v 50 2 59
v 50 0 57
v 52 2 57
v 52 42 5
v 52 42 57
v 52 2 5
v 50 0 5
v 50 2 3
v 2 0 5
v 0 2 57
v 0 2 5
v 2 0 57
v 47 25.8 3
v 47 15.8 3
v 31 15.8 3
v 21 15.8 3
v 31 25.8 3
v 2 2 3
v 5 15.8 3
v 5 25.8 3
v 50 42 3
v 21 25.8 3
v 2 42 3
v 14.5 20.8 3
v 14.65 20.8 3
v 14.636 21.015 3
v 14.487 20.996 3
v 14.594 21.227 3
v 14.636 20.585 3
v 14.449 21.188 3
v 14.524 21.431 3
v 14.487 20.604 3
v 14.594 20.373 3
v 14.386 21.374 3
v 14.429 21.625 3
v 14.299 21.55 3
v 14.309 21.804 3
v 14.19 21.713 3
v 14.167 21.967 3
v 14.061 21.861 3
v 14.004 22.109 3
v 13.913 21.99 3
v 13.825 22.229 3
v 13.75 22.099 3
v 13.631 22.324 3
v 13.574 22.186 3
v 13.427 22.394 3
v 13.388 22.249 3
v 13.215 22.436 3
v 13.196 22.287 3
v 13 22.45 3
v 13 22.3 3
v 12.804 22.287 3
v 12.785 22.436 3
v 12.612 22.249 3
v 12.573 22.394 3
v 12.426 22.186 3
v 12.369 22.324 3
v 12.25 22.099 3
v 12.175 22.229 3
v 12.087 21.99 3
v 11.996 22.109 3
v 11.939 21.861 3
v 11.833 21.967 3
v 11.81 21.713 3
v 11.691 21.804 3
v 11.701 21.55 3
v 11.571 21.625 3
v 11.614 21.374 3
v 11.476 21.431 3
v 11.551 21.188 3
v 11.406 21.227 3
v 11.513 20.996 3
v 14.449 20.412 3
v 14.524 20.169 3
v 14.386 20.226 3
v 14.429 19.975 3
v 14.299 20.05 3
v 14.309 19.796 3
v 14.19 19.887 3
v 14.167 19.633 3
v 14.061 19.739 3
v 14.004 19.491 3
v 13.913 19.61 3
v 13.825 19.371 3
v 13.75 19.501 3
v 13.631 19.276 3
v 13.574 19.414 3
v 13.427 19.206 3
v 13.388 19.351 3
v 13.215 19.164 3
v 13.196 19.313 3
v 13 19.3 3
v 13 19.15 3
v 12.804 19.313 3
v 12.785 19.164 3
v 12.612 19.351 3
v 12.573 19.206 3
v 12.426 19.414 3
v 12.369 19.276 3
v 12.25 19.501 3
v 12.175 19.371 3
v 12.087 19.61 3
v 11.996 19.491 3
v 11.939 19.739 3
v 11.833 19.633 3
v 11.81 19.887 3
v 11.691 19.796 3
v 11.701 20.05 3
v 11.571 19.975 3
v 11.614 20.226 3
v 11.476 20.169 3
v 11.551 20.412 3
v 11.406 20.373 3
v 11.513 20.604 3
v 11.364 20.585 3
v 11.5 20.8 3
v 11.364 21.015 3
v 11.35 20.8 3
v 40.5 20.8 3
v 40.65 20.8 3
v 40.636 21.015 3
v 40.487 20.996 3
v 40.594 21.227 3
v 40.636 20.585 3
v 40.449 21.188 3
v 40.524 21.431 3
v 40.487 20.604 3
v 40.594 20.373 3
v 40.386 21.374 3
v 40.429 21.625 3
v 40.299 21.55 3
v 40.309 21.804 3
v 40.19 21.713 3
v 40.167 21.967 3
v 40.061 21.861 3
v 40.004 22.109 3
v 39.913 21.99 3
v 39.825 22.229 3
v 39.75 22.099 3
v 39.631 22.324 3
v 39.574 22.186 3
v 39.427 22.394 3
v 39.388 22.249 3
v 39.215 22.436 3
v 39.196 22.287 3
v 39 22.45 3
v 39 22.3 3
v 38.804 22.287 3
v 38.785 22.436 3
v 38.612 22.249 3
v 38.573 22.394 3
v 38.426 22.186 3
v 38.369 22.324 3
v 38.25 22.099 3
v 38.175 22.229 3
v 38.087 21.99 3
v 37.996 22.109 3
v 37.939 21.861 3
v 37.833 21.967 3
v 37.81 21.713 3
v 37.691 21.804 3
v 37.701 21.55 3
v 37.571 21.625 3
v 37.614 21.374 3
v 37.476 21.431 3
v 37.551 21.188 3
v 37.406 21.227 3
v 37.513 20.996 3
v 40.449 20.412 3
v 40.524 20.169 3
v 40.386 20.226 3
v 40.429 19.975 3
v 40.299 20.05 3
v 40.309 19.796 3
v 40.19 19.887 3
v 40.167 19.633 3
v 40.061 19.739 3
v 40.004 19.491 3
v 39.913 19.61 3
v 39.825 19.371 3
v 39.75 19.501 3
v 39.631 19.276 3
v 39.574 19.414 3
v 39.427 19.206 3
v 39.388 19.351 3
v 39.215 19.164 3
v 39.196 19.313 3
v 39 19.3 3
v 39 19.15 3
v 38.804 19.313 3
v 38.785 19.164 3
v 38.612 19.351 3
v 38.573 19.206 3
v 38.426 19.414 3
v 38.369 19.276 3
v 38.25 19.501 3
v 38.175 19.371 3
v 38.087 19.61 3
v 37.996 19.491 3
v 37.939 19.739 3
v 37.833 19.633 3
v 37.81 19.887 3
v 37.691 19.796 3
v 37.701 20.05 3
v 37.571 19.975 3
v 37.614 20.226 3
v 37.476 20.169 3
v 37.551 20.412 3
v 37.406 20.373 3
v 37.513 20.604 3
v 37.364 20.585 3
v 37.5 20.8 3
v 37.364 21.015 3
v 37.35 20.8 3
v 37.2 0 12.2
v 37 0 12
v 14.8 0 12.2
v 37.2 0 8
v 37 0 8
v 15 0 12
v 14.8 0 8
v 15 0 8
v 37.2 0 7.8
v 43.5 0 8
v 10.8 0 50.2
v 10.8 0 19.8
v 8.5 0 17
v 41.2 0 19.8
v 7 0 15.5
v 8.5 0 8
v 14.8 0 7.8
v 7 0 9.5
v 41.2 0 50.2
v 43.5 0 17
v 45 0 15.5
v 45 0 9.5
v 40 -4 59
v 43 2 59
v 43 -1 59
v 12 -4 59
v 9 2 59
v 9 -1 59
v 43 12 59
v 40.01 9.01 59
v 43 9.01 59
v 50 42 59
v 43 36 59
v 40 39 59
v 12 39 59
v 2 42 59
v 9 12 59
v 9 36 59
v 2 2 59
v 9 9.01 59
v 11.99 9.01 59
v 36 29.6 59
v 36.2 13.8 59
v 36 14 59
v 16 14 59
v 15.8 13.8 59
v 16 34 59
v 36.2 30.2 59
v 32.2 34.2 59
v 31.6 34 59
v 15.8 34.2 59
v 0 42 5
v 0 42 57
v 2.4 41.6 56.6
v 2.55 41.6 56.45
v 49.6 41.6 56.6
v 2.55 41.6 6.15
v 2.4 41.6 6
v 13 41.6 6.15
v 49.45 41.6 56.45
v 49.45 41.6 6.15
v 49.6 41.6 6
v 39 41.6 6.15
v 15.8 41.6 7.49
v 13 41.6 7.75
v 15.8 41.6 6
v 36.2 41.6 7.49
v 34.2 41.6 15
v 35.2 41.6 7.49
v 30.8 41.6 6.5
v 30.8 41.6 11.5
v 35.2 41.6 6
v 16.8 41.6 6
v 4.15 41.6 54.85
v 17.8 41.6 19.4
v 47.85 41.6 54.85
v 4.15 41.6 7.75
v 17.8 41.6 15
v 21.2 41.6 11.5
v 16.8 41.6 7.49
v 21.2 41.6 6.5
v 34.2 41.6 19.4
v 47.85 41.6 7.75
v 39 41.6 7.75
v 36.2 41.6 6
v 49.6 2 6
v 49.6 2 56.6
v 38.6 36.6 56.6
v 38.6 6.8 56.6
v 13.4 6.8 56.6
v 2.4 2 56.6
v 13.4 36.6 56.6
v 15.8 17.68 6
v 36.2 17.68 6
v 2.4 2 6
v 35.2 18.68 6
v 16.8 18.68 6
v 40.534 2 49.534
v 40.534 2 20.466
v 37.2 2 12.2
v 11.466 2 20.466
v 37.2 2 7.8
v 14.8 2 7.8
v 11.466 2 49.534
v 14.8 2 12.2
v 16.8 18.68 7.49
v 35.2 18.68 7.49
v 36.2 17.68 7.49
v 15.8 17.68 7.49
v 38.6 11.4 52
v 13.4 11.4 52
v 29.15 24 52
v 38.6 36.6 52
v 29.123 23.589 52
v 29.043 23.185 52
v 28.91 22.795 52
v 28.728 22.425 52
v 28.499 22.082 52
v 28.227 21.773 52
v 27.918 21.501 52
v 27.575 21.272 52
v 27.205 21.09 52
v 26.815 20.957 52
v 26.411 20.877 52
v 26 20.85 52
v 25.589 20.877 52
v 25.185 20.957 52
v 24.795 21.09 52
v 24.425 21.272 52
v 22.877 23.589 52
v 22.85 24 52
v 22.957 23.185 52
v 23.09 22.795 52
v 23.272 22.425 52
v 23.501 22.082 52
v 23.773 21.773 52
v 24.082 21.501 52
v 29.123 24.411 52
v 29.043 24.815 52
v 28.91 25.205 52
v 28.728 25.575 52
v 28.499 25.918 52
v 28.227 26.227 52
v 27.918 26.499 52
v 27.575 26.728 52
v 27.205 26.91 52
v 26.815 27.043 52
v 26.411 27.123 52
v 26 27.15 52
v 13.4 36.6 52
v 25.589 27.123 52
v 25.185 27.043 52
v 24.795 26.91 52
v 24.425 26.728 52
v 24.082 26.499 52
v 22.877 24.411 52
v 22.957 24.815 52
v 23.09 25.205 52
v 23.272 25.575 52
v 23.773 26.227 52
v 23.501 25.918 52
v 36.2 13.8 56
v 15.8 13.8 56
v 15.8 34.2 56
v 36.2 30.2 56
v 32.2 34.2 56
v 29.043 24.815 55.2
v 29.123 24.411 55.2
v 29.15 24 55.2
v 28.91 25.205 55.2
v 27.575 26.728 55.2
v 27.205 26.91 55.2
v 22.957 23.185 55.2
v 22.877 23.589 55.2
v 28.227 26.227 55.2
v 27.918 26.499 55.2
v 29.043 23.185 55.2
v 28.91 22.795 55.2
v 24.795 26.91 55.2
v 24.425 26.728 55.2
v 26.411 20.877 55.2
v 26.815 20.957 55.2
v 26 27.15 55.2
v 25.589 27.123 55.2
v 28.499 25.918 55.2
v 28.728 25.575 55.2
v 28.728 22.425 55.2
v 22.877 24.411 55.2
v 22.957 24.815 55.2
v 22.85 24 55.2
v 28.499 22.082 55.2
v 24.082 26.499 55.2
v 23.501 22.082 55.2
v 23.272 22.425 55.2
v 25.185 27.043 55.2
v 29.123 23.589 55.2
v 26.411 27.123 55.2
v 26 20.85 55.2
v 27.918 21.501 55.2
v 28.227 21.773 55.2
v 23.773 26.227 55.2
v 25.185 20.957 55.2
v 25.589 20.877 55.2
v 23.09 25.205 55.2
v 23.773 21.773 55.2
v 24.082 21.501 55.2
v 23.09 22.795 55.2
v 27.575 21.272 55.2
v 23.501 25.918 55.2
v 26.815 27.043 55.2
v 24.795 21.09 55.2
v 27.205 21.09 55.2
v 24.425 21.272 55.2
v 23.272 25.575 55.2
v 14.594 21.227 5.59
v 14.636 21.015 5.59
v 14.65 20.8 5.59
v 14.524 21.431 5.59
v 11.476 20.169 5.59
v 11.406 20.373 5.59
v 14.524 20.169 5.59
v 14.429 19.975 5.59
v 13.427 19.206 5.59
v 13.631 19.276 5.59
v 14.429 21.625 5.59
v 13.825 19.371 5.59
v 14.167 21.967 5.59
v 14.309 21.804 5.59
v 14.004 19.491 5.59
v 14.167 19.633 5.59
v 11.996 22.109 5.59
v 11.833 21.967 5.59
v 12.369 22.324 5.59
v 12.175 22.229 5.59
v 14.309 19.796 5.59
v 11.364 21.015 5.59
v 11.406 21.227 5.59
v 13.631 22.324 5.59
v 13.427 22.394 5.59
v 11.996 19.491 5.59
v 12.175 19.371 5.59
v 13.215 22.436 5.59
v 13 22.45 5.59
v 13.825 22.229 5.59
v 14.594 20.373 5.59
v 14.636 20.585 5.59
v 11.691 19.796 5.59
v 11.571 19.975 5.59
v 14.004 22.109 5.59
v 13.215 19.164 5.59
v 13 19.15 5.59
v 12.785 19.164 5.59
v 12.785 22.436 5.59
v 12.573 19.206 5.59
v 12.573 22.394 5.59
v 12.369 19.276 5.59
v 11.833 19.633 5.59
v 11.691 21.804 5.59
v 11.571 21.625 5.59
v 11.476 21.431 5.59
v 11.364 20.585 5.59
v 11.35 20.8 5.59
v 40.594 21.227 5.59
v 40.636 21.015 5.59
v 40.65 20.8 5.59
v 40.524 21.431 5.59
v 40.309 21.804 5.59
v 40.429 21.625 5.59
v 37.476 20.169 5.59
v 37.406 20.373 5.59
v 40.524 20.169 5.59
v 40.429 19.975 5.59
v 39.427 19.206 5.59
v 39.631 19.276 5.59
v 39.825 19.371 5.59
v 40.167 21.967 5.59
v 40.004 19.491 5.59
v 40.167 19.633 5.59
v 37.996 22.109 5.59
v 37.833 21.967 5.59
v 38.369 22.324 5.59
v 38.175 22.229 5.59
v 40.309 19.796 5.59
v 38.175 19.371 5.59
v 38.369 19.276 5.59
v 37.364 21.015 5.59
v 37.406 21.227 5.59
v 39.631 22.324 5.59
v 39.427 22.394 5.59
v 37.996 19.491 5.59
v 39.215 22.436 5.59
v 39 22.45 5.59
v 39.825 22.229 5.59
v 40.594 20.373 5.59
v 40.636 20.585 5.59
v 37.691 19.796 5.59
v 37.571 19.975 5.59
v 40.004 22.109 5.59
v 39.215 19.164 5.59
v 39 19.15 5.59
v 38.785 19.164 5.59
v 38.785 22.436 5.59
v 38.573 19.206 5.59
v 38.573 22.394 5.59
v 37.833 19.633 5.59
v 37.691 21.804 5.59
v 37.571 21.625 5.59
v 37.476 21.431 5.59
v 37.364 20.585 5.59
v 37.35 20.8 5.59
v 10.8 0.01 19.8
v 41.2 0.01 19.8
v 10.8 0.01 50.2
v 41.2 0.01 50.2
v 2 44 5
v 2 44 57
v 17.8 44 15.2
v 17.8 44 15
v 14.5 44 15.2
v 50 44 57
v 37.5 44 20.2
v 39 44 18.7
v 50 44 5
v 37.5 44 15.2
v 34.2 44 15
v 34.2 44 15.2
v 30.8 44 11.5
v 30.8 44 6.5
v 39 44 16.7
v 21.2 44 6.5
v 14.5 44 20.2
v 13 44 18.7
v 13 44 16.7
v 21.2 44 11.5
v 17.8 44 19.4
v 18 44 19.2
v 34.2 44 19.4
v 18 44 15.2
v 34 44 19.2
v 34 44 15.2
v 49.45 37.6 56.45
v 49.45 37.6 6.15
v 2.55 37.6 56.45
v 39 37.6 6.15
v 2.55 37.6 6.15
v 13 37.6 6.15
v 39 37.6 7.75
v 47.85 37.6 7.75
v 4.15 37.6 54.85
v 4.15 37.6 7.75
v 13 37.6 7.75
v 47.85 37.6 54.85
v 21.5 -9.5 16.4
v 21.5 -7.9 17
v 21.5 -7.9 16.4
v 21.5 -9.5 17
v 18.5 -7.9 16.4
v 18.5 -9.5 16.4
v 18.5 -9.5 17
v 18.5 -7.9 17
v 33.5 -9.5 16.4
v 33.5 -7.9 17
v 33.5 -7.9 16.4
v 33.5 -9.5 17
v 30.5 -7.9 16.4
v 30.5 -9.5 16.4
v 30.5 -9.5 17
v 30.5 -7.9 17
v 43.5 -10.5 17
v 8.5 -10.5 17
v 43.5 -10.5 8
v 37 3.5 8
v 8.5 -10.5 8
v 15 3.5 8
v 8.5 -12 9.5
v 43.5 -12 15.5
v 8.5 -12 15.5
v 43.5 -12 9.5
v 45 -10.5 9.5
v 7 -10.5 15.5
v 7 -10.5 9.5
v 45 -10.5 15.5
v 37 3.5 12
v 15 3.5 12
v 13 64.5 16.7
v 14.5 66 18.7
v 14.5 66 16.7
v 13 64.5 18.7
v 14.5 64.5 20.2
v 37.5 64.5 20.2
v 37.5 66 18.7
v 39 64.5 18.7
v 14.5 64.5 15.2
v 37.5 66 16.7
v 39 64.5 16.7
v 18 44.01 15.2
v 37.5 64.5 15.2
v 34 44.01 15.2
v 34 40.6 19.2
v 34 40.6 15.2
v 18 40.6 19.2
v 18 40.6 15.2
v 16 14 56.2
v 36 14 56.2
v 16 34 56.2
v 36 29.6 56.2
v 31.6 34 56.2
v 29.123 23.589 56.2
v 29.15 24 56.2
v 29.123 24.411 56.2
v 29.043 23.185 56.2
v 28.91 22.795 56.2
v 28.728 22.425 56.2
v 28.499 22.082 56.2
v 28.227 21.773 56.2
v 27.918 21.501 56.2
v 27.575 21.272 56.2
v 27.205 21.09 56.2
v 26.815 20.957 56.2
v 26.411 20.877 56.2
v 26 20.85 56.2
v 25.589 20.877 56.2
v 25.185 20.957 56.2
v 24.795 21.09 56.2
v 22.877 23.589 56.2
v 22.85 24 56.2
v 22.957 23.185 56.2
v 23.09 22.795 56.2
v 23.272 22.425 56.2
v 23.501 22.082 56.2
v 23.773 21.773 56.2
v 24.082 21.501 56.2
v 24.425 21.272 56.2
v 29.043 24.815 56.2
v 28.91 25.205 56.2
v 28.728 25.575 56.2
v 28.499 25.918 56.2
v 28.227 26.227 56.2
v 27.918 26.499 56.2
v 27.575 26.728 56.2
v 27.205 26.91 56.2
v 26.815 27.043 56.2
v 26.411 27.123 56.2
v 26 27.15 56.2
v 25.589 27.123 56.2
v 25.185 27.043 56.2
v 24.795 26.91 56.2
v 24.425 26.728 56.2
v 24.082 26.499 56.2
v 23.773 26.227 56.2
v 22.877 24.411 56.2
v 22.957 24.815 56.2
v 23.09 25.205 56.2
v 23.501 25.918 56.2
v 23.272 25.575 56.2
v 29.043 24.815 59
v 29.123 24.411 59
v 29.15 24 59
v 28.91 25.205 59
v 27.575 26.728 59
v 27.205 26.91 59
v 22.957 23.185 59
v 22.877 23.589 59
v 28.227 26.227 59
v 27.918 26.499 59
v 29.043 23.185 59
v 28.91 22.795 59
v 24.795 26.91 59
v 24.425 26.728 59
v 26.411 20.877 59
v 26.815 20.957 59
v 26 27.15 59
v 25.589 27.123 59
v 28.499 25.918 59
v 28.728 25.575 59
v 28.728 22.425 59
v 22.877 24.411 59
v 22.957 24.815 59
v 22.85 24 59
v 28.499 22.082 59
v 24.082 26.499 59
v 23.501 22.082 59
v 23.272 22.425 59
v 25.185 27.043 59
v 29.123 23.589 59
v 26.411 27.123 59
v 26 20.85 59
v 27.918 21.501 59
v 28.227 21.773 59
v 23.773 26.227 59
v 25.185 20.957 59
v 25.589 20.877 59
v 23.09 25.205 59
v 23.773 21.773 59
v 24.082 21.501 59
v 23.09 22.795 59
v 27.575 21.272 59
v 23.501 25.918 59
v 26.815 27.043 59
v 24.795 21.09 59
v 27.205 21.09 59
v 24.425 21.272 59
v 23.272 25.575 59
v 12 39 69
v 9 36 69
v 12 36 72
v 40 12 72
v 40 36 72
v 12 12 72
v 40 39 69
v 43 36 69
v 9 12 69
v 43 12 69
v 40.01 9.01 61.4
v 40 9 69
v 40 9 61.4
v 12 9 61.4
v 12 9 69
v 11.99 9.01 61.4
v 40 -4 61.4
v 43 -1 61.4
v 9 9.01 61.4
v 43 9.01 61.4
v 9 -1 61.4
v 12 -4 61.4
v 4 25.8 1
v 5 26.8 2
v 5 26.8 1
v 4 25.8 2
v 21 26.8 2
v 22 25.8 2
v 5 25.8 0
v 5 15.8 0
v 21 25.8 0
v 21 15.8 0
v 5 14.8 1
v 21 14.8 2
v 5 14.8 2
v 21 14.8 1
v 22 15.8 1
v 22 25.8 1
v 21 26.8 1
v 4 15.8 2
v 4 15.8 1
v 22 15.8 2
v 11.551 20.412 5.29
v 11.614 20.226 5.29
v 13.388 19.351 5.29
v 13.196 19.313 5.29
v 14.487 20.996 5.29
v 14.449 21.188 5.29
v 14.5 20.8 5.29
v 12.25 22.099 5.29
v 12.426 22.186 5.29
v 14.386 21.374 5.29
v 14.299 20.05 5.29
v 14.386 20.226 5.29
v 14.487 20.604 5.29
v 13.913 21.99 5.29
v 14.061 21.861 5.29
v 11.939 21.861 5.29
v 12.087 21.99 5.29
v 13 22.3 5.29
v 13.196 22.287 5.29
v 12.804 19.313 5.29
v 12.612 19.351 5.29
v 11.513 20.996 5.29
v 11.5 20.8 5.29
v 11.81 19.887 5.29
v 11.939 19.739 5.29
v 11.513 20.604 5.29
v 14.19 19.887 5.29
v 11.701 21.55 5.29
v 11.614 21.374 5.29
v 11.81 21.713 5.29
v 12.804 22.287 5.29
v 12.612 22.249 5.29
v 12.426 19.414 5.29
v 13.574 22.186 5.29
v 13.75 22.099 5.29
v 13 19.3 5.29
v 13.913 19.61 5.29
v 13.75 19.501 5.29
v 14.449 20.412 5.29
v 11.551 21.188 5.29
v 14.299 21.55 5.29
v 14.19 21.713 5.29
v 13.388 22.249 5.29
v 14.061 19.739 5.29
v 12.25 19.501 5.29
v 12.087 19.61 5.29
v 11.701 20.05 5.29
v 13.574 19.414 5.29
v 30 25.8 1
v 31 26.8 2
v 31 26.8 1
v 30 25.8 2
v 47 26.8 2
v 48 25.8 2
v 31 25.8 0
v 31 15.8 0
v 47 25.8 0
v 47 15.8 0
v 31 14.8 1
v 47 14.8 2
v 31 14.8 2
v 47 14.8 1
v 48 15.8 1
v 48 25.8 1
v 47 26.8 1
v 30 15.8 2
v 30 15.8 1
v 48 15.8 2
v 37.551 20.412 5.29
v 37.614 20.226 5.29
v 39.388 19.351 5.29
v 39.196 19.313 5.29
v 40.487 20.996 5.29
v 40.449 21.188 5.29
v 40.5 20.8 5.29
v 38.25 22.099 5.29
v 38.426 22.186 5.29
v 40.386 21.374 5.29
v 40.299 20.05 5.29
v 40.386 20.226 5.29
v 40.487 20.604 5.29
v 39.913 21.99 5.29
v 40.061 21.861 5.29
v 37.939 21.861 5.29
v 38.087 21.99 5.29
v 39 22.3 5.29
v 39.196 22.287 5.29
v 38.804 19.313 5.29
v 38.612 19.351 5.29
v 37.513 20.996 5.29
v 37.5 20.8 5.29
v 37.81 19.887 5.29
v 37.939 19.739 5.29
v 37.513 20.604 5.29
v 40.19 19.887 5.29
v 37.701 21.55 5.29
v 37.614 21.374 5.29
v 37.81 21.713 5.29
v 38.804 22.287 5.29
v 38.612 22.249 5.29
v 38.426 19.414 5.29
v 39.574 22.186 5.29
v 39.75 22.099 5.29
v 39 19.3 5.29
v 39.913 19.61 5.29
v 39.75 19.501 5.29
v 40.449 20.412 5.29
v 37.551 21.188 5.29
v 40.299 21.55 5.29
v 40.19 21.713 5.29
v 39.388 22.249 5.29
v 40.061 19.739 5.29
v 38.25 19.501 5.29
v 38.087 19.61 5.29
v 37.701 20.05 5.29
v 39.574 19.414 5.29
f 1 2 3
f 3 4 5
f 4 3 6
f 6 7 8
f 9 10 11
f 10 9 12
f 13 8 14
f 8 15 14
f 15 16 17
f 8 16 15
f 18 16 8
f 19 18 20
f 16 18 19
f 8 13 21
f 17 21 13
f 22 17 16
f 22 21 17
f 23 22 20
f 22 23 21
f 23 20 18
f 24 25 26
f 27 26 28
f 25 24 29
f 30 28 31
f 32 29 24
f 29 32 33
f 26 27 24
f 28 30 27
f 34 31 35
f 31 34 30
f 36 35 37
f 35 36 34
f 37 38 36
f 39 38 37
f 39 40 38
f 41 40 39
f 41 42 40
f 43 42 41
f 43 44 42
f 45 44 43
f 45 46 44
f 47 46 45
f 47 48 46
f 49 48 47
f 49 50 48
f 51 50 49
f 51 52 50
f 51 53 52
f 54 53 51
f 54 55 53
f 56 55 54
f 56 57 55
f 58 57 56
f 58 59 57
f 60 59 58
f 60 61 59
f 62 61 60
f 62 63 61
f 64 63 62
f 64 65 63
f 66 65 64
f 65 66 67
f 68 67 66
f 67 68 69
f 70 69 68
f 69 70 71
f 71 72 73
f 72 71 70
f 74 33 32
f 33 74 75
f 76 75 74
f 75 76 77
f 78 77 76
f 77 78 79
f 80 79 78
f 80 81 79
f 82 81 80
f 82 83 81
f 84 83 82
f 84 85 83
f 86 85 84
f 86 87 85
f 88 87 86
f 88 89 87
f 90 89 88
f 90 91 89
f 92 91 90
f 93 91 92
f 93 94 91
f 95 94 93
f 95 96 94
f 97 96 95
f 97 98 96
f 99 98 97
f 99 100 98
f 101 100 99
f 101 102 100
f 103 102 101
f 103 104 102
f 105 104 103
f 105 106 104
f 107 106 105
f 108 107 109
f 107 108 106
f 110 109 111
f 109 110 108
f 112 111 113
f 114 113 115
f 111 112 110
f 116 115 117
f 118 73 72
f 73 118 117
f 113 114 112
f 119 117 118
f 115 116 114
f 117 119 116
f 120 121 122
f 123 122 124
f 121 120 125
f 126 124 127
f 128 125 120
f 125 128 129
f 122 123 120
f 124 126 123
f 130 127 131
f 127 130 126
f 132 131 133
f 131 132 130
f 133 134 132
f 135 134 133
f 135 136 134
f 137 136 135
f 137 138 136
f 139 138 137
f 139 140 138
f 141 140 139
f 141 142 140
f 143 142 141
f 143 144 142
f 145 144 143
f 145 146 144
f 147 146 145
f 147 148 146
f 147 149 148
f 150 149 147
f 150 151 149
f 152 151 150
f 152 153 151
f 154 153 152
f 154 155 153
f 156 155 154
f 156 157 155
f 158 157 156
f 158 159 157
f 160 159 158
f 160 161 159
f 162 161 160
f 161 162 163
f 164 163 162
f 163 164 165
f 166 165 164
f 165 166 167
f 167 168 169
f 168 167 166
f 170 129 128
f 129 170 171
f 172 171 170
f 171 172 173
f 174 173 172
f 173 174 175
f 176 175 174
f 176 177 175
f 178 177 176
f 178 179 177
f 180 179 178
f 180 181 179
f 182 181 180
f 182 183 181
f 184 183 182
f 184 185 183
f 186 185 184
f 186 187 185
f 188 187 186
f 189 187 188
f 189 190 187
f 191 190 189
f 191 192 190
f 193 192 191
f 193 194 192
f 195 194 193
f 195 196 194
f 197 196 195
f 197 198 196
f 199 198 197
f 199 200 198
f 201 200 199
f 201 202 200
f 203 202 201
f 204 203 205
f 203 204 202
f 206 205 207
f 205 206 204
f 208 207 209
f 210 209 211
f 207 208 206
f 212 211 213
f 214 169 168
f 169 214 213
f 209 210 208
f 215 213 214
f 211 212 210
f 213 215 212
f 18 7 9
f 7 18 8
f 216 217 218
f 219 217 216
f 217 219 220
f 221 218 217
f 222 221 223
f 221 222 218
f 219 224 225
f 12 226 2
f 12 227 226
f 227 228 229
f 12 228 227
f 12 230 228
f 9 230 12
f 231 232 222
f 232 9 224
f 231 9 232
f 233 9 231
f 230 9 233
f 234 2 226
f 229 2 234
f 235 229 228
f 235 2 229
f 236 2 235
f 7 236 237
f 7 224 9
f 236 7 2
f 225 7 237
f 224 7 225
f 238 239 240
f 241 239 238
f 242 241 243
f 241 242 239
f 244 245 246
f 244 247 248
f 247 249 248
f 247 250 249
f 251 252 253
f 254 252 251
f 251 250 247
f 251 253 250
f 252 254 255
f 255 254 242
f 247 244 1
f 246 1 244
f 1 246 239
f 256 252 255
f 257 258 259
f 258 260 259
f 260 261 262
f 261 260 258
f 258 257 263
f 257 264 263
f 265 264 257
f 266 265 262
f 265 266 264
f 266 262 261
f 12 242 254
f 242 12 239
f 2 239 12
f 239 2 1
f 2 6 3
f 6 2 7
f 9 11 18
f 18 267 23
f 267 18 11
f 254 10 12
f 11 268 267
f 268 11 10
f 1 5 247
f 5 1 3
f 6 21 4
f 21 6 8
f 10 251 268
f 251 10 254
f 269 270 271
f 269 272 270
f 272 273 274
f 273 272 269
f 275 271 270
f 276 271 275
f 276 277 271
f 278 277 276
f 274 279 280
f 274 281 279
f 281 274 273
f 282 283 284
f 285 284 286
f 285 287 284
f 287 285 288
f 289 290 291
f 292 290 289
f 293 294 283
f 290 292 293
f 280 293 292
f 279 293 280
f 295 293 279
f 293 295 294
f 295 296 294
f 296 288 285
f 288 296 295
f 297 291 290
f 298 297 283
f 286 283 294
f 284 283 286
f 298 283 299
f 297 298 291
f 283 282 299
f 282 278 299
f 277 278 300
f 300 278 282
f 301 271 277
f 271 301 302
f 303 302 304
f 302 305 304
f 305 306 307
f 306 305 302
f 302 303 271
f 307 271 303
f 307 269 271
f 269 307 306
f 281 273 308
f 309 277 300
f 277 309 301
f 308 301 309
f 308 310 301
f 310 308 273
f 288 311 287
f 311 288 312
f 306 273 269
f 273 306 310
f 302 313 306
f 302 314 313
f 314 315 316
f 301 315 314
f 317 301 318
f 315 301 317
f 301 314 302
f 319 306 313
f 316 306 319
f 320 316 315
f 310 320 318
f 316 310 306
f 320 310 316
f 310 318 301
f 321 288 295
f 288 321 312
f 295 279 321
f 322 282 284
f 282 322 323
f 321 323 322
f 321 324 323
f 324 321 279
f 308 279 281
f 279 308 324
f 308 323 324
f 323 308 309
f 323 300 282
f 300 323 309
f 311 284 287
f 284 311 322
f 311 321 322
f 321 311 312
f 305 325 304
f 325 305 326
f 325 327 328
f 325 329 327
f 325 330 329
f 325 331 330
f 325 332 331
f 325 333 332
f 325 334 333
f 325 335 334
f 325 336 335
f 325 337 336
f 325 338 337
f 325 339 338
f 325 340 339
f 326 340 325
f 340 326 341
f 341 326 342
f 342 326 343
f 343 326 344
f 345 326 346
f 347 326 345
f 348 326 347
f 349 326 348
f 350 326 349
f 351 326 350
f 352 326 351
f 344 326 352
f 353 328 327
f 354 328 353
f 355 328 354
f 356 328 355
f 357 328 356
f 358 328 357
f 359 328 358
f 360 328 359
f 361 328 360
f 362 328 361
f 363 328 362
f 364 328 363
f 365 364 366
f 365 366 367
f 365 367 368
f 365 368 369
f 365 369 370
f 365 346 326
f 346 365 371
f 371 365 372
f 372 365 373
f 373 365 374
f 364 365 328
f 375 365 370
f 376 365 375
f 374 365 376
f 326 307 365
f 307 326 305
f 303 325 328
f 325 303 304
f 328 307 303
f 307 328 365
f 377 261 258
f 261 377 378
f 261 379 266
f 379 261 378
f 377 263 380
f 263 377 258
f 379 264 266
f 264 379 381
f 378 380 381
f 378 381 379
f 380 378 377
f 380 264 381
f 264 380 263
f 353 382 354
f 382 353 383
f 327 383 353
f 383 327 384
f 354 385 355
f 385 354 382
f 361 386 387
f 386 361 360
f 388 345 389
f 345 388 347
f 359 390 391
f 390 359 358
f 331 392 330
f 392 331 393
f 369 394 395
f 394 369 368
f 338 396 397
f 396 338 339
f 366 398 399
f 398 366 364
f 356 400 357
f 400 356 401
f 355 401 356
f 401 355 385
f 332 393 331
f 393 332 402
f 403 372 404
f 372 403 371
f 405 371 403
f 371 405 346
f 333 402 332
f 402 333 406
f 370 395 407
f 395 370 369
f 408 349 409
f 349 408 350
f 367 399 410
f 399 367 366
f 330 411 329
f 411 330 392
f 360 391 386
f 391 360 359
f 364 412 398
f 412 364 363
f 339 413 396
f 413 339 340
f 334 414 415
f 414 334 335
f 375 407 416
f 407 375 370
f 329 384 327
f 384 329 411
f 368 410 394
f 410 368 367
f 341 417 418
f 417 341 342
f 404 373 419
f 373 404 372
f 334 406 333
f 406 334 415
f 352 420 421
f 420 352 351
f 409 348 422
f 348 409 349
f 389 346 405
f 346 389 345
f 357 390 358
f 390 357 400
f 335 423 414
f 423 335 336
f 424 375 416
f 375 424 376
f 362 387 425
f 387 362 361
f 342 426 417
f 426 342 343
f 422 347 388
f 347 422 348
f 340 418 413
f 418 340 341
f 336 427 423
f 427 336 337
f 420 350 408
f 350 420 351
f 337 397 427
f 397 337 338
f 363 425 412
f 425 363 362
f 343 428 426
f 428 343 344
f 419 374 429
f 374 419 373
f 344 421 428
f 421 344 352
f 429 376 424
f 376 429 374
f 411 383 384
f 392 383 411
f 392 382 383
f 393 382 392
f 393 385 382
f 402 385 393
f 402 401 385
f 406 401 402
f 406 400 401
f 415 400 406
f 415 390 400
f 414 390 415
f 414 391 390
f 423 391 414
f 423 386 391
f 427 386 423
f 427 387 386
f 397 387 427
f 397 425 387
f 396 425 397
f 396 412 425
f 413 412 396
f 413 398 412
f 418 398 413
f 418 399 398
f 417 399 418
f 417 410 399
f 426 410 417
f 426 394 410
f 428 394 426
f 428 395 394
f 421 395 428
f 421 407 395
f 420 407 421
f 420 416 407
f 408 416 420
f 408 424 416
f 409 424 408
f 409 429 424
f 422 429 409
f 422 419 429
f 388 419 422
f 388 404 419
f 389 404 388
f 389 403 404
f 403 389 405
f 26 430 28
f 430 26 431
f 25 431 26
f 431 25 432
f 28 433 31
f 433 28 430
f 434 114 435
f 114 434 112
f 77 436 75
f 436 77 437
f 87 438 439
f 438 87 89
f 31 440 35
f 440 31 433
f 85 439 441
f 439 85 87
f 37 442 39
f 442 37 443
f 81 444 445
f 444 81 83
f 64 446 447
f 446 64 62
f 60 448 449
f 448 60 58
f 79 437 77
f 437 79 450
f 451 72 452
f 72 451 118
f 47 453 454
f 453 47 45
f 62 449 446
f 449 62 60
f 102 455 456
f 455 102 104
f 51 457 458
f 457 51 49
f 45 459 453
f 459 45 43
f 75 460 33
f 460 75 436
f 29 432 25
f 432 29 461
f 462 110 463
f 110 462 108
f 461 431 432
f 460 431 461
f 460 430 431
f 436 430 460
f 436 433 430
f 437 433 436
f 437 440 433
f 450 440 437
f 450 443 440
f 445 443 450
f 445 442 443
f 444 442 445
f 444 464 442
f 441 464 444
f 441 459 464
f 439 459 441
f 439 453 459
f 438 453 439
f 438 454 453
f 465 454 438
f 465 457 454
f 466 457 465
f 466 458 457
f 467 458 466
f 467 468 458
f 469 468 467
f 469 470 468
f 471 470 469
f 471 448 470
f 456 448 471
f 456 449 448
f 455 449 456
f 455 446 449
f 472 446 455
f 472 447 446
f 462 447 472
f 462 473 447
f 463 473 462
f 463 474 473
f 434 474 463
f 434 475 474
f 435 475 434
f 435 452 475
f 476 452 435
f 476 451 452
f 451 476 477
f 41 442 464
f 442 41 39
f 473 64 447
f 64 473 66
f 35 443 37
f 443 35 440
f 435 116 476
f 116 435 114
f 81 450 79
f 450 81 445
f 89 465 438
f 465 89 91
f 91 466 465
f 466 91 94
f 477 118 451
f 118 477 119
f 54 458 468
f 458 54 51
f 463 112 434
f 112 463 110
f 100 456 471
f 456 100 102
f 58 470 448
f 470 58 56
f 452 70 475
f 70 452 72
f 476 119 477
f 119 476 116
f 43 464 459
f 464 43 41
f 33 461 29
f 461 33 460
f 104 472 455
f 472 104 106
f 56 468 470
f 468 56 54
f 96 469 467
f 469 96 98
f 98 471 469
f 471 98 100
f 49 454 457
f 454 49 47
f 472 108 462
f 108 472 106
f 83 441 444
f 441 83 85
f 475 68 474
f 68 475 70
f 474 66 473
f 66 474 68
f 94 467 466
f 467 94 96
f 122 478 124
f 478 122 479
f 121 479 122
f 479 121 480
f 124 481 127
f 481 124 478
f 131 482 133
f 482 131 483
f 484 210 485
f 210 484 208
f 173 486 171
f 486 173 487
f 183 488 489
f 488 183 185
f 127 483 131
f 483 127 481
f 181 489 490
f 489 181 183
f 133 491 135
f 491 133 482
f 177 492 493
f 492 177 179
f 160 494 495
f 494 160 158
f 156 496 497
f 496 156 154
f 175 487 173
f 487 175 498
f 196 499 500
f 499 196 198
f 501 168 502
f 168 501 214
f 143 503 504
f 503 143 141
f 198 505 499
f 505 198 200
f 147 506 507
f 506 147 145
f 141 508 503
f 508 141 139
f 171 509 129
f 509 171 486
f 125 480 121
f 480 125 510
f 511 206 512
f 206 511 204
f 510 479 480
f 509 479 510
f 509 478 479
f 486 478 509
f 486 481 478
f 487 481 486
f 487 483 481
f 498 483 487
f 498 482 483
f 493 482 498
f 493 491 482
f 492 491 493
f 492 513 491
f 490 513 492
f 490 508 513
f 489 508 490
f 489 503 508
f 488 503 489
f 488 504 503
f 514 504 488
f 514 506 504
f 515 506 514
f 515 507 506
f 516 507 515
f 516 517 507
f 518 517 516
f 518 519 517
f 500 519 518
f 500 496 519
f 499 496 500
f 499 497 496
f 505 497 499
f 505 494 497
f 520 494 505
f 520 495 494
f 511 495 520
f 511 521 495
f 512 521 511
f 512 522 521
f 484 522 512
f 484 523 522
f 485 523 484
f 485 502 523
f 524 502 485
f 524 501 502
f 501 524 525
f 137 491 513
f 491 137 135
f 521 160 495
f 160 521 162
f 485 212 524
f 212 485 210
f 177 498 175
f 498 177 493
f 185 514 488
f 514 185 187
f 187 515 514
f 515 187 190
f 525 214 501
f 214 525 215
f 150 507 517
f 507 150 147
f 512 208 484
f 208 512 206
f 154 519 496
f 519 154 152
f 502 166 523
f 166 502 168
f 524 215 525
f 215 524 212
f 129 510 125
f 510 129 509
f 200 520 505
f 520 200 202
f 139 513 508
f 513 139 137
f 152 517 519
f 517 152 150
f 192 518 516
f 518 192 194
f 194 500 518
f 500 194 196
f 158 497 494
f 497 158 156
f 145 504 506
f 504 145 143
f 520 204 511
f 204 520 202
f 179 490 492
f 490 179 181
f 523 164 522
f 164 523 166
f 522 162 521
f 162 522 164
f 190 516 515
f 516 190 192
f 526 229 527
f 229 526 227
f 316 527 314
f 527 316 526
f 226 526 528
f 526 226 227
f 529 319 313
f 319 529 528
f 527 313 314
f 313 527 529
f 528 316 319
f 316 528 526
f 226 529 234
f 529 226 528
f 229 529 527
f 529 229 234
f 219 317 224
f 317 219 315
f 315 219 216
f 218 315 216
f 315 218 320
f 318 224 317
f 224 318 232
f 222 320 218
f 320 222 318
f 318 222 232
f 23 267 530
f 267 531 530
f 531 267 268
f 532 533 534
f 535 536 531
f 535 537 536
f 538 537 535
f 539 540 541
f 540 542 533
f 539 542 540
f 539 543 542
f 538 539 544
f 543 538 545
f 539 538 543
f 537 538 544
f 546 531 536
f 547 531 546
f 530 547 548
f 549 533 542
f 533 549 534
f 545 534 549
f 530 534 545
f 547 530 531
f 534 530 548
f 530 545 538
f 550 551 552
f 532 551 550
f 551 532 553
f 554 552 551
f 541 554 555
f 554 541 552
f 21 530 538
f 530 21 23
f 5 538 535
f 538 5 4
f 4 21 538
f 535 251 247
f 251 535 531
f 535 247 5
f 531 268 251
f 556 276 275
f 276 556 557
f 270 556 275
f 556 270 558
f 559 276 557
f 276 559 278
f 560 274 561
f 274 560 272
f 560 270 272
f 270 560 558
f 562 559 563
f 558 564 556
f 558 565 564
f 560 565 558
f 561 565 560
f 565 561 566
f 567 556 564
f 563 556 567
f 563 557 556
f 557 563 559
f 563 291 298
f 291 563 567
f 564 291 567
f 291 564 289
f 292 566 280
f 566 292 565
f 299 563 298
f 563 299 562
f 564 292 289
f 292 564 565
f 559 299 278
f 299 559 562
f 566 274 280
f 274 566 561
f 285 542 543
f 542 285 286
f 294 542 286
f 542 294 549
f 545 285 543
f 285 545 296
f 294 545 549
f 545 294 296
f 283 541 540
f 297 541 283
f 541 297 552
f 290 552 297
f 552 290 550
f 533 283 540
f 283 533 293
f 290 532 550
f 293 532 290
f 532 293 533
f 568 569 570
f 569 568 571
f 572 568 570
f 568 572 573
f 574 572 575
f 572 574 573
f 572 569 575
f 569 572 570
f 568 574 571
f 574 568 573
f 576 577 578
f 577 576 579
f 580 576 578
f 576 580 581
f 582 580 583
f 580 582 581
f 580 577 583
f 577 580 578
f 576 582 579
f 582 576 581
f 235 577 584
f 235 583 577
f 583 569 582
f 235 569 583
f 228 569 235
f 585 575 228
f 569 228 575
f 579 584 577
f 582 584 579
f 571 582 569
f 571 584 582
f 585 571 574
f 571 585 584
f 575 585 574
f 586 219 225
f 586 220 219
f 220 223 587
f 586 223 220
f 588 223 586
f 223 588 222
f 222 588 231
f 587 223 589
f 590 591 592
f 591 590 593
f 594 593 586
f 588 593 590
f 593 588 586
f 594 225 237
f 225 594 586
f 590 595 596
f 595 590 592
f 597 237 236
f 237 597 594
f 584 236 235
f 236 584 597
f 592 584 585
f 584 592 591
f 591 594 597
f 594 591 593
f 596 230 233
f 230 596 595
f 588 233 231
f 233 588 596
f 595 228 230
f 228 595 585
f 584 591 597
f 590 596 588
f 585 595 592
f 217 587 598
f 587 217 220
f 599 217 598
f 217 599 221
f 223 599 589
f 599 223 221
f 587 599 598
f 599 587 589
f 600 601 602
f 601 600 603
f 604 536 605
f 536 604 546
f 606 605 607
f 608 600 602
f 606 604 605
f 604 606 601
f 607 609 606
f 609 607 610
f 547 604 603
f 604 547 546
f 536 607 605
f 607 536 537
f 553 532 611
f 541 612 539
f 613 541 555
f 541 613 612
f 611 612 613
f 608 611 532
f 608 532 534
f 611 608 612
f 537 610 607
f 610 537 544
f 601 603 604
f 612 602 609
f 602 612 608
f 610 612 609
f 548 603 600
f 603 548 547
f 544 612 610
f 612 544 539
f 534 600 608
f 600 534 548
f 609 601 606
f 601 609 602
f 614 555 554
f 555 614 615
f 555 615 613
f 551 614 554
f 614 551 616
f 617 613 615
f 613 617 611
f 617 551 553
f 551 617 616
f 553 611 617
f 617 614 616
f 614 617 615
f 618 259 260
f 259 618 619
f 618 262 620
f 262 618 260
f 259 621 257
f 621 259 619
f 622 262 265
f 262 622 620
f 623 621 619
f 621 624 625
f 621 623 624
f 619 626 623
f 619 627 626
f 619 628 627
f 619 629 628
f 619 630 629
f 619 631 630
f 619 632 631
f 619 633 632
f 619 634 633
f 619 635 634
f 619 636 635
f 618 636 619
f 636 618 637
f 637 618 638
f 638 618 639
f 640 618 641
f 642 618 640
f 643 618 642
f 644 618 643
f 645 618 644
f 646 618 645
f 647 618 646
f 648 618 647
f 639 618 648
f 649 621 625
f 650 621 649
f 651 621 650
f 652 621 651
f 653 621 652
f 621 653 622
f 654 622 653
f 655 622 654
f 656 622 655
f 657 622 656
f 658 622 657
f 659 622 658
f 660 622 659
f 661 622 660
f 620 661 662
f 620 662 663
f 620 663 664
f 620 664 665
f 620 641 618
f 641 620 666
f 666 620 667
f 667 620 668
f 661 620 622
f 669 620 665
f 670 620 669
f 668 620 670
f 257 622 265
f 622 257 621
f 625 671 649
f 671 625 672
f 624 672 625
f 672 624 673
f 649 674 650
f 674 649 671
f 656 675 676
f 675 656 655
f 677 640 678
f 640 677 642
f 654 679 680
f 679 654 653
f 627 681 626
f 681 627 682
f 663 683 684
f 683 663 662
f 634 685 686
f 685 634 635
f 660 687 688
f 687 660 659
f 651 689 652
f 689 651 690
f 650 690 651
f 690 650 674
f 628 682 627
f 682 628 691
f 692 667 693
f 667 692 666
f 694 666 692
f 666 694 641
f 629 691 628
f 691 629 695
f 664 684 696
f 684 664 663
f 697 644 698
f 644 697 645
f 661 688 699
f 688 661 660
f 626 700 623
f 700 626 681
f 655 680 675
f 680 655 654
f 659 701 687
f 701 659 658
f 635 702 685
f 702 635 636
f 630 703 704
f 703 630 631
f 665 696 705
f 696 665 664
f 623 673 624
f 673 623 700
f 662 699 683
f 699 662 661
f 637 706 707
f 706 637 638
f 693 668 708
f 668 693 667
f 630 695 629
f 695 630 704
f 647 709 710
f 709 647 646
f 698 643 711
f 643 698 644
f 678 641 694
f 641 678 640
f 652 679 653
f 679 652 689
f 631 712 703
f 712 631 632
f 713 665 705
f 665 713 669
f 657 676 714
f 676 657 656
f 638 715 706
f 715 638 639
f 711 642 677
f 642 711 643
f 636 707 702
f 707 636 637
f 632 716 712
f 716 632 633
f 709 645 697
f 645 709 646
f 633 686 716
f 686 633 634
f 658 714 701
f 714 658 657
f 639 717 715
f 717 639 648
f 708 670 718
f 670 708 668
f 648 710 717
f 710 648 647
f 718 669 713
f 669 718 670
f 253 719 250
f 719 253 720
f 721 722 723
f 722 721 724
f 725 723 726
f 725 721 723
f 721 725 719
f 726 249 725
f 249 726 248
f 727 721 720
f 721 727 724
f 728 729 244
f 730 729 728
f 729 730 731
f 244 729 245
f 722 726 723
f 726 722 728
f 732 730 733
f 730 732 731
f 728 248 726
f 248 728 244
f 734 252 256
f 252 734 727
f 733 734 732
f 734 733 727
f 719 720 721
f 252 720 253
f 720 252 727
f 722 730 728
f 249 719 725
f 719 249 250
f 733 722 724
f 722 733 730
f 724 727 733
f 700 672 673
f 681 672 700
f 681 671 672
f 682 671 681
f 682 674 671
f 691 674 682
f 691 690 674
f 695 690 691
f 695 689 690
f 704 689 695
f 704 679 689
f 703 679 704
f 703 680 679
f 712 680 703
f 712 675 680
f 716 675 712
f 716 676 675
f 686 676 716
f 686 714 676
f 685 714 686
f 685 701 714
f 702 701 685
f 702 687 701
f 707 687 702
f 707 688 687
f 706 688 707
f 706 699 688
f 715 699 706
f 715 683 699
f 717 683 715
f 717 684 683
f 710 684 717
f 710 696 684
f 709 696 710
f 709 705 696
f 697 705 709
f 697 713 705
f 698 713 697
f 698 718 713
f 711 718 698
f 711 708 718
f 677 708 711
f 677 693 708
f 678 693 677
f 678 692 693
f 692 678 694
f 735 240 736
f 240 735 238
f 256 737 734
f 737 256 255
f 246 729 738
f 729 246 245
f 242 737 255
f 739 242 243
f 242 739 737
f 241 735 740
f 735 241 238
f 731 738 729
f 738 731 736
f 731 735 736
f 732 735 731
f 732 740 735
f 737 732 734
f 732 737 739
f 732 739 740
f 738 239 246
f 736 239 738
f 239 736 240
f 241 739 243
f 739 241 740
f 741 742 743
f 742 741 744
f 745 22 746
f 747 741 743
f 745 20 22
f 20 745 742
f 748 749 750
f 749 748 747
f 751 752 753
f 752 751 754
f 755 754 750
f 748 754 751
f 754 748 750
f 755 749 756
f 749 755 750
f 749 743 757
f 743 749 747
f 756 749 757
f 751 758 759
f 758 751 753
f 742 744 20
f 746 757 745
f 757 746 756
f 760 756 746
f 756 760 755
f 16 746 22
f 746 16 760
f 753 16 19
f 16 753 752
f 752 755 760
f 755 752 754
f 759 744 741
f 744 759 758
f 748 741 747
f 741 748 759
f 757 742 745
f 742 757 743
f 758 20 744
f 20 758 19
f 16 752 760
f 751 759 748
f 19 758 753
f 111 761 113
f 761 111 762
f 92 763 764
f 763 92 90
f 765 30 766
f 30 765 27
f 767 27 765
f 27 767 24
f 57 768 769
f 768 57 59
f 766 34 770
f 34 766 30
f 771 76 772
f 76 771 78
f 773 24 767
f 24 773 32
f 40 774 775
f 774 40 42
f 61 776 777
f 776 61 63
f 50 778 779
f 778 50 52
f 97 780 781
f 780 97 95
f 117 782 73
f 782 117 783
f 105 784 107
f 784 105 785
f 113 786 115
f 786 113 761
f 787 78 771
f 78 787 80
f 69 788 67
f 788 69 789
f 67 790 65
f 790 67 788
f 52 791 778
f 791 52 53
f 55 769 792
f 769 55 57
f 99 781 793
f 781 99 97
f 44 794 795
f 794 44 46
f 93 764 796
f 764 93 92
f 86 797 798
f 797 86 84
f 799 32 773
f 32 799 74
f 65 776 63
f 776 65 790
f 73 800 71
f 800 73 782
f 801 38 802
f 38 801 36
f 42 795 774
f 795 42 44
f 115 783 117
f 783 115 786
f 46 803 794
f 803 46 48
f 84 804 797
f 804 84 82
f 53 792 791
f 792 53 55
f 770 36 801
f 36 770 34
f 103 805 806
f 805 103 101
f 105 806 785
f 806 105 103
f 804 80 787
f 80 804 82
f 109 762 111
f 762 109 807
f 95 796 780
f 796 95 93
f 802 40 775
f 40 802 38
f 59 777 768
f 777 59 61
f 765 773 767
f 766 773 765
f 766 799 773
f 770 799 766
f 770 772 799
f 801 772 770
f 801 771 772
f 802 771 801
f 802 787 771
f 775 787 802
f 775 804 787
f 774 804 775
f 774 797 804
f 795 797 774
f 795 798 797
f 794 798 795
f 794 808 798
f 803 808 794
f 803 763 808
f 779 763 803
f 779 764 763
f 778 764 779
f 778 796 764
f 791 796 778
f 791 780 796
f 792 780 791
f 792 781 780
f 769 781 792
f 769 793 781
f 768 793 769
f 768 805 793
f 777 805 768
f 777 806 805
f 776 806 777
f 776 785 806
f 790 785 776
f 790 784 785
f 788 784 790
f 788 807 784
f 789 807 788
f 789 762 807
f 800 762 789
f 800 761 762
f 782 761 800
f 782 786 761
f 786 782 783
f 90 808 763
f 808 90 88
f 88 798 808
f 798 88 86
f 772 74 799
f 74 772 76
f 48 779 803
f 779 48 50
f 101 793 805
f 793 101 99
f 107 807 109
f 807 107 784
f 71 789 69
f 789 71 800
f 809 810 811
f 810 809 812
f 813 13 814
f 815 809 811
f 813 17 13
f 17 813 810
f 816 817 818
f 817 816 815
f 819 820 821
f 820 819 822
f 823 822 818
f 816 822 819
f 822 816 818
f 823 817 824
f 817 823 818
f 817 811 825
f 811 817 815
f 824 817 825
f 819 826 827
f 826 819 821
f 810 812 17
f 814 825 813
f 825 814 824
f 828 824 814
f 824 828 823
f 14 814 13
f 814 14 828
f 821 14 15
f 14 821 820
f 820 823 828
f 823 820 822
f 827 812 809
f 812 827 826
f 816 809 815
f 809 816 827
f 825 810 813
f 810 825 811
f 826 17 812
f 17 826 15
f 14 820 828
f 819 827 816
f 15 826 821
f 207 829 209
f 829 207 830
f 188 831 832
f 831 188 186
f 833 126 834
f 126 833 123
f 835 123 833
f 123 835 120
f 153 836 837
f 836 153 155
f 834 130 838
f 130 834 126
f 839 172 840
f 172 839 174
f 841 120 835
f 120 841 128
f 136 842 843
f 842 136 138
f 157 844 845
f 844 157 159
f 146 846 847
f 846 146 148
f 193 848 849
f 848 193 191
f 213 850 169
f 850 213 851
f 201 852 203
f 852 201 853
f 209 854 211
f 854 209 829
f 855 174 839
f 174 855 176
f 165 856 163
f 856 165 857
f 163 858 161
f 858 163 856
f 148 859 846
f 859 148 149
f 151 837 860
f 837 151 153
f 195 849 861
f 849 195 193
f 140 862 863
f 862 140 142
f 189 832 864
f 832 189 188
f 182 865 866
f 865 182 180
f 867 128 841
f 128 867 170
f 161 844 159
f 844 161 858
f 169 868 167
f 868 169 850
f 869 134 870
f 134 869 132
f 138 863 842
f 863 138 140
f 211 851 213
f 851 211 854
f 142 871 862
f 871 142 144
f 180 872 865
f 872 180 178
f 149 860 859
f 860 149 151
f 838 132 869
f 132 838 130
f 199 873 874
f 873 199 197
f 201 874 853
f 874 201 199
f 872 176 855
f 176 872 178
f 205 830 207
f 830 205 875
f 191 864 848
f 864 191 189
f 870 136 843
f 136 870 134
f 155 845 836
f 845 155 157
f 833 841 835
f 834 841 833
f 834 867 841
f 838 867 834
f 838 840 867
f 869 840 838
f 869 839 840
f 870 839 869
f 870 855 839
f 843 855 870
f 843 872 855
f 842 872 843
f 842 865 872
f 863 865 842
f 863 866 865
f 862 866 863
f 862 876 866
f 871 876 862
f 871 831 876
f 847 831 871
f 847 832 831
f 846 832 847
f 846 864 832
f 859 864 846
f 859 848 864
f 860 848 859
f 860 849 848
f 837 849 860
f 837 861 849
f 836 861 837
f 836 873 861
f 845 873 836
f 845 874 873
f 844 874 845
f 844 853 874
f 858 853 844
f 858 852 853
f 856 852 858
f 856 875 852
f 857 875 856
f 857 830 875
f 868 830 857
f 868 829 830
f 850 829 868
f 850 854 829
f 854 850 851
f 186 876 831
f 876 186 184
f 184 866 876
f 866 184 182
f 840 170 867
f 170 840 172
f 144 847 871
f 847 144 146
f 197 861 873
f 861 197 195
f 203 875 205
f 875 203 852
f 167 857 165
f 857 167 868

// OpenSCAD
// =====================================================================
//  Cubo modular · v2  (basado en la electrónica de clawd-mochi, MIT)
//  Carcasa nueva y paramétrica. Unidades: mm.
//
//  Ejes: X = ancho (izq->dcha), Y = fondo (frente y=0 -> detrás),
//        Z = alto (suelo z=0). El frente es la cara de la pantalla.
//
//  Elegir pieza:  openscad -D 'parte="carcasa"' -o carcasa.stl cubo.scad
//  Piezas: carcasa, tapa_trasera, pico, cola, patas, gorra,
//          base_accesorio, prueba_encaje, ensamblaje (solo vista)
// =====================================================================

parte = "ensamblaje";

/* ---------- Cuerpo ---------- */
W      = 52;     // ancho exterior
H      = 56;     // alto exterior (sin patas)
D      = 44;     // fondo total (carcasa + tapa trasera)
CH     = 2;      // chaflán de las aristas exteriores
pared  = 2.4;    // paredes laterales
frente = 2.0;    // pared frontal (la de la pantalla)
suelo  = 3.0;    // suelo
techo  = 2.4;    // techo
T_tapa = 2.4;    // grosor de la tapa trasera
D_c    = D - T_tapa;   // fondo de la carcasa

/* ---------- Pantalla ST7789 1,54" ---------- */
// Zona activa del panel: 27,72 x 27,72 mm. La ventana deja 0,3 mm de margen.
ventana   = 28.4;
ventana_z = 32;    // altura del centro de la ventana
bisel     = 1.0;   // bisel exterior de la ventana

/* ---------- Enchufe de accesorios (estándar común) ---------- */
enchufe      = 20;    // lado nominal del tapón
holgura      = 0.2;   // holgura por lado (ajustar con prueba_encaje)
enchufe_prof = 3;     // profundidad del hueco
llave        = 4;     // esquina cortada (detrás-derecha) que fija la orientación
enchufe_y    = 24;    // posición en fondo del centro del enchufe
iman_d       = 6.3;   // imán Ø6 x 3 mm (+holgura)
iman_h       = 3.2;
piel         = 0.8;   // plástico entre imán y fondo del hueco

/* ---------- Pico y cola (encaje a presión) ---------- */
pico_w = 38;  pico_l = 12;  pico_h = 9;  pico_z = 5;
lengua_w = 22; lengua_h = 4; lengua_l = 3.5;
cola_w = 26;  cola_l = 22;  cola_h = 5;  cola_z = 12.2;
cola_lengua_w = 16; cola_lengua_h = 4; cola_lengua_l = 3.4;
ajuste = 0.2;          // holgura por lado en ranuras de pico/cola/tapa

/* ---------- ESP32-C3 Super Mini ---------- */
esp_w = 18;  esp_l = 22.52;
usb_w = 9.6; usb_h = 5; usb_z = suelo + 3;   // centro del hueco USB-C

/* ---------- Patas ---------- */
pata_w = 18; pata_l = 12; pata_h = 3; pata_sep = 13; pivote_d = 3;

$fn = 48;
e = 0.01;

// ---------------------------------------------------------------
module caja_chaflan(s, c) {
    hull() {
        translate([c, 0, c]) cube([s[0]-2*c, s[1], s[2]-2*c]);
        translate([0, c, c]) cube([s[0], s[1]-2*c, s[2]-2*c]);
        translate([c, c, 0]) cube([s[0]-2*c, s[1]-2*c, s[2]]);
    }
}

// Perfil cuadrado con la esquina (+X,+Y) cortada. Centrado en el origen.
module perfil_llave(lado, corte) {
    a = lado/2;
    polygon([[-a,-a],[a,-a],[a,a-corte],[a-corte,a],[-a,a]]);
}

// Un único imán centrado. La esquina cortada fija la orientación.
module huecos_iman(z0) {
    translate([0, 0, z0]) cylinder(d = iman_d, h = iman_h);
}

// Hueco hembra (en cabeza o en prueba). z_sup = cara superior.
module enchufe_hembra(z_sup) {
    translate([0, 0, z_sup - enchufe_prof])
        linear_extrude(enchufe_prof + 1) perfil_llave(enchufe + 2*holgura, llave);
    huecos_iman(z_sup - enchufe_prof - piel - iman_h);
}

// Tapón macho estándar que llevan todos los accesorios (debajo de z=0).
tapon_h = enchufe_prof - 0.2;
module tapon() {
    difference() {
        translate([0, 0, -tapon_h]) linear_extrude(tapon_h + e)
            perfil_llave(enchufe, llave + 0.4);
        huecos_iman(-tapon_h - e);
    }
}

// ---------------------------------------------------------------
module cuerpo_exterior() { caja_chaflan([W, D, H], CH); }

module carcasa() {
    boss = enchufe + 2*holgura + 2*2.4;
    z_boss = H - enchufe_prof - piel - iman_h;
    difference() {
        union() {
            difference() {
                intersection() { cuerpo_exterior(); translate([-1, -1, -1]) cube([W+2, D_c+1, H+2]); }
                translate([pared, frente, suelo]) cube([W - 2*pared, D_c, H - suelo - techo]);
            }
            // Refuerzo bajo el enchufe, con rampa a 45° para imprimir sin soportes
            translate([W/2, enchufe_y, 0]) hull() {
                translate([-boss/2, -boss/2, z_boss]) cube([boss, boss, H - techo - z_boss + e]);
                translate([-boss/2, -boss/2 - (H - techo - z_boss), H - techo]) cube([boss, boss + (H - techo - z_boss), e]);
            }
            // Guías para la ESP32 en el suelo (pegada con cinta)
            translate([W/2, D_c, suelo - e]) {
                for (s = [-1, 1]) translate([s*(esp_w/2 + 0.2 + 0.5) - 0.5, -(esp_l + 0.4) - 1, 0]) cube([1, esp_l + 1.4, 1.5]);
                translate([-(esp_w/2 + 1.2), -(esp_l + 0.4) - 1, 0]) cube([esp_w + 2.4, 1, 1.5]);
            }
        }
        // Ventana de la pantalla con bisel exterior
        translate([W/2, 0, ventana_z]) hull() {
            translate([-ventana/2, frente/2, -ventana/2]) cube([ventana, frente/2 + 1, ventana]);
            translate([-ventana/2 - bisel, -1, -ventana/2 - bisel]) cube([ventana + 2*bisel, 1 + e, ventana + 2*bisel]);
        }
        // Ranura del pico
        translate([W/2 - lengua_w/2 - ajuste, -1, pico_z - ajuste]) cube([lengua_w + 2*ajuste, frente + 2, lengua_h + 2*ajuste]);
        // Enchufe de accesorios + imanes (los imanes se meten desde dentro)
        translate([W/2, enchufe_y, 0]) enchufe_hembra(H);
        // Agujeros de las patas
        for (s = [-1, 1]) translate([W/2 + s*pata_sep, D_c/2, -e]) cylinder(d = pivote_d + 0.3, h = 2.6);
    }
}

module tapa_trasera() {
    lab = 1.6; lab_l = 4;
    ox = W - 2*pared - 2*0.15; oz = H - suelo - techo - 2*0.15;
    difference() {
        union() {
            intersection() { cuerpo_exterior(); translate([-1, D_c, -1]) cube([W+2, T_tapa + 1, H+2]); }
            // Labio que entra a presión en la carcasa (con hueco abajo para la ESP32)
            translate([pared + 0.15, D_c - lab_l, suelo + 0.15]) difference() {
                cube([ox, lab_l + e, oz]);
                translate([lab, -1, lab]) cube([ox - 2*lab, lab_l + 2, oz - 2*lab]);
                translate([ox/2 - 13, -1, -1]) cube([26, lab_l + 2, lab + 2]);
            }
        }
        // Hueco USB-C
        translate([W/2 - usb_w/2, D_c - lab_l - 1, usb_z - usb_h/2]) cube([usb_w, T_tapa + lab_l + 2, usb_h]);
        // Ranura de la cola
        translate([W/2 - cola_lengua_w/2 - ajuste, D_c - 1, cola_z - ajuste]) cube([cola_lengua_w + 2*ajuste, T_tapa + 2, cola_lengua_h + 2*ajuste]);
    }
}

module pico() {
    // Coordenadas de montaje: cara trasera del pico en y=0, se extiende hacia -Y
    translate([W/2 - pico_w/2, -pico_l, pico_z]) difference() {
        caja_chaflan([pico_w, pico_l + CH, pico_h], 1.5);
        translate([-1, pico_l, -1]) cube([pico_w + 2, CH + 1, pico_h + 2]);  // cara trasera plana
        for (s = [-1, 1]) translate([pico_w/2 + s*6 - 1.5, 2.5, pico_h - 0.6]) cube([3, 1.6, 1]);  // fosas
    }
    translate([W/2 - lengua_w/2, -e, pico_z]) cube([lengua_w, lengua_l + e, lengua_h]);
}

module cola() {
    translate([W/2 - cola_w/2, D, cola_z]) difference() {
        translate([0, -CH, 0]) caja_chaflan([cola_w, cola_l + CH, cola_h], 1.5);
        translate([-1, -CH - 1, -1]) cube([cola_w + 2, CH + 1, cola_h + 2]);
    }
    translate([W/2 - cola_lengua_w/2, D - T_tapa - (cola_lengua_l - T_tapa), cola_z]) cube([cola_lengua_w, cola_lengua_l + e, cola_lengua_h]);
}

module pata() {
    caja_chaflan([pata_w, pata_l, pata_h], 1);
    translate([pata_w/2, pata_l/2, pata_h - e]) cylinder(d = pivote_d, h = 2.3);
}

module gorra() {
    // Accesorio de ejemplo. Visera hacia -Y (frente).
    cw = 34; cl = 30; chh = 13;
    tapon();
    intersection() {   // copa con chaflán solo arriba
        translate([-cw/2, -cl/2, -3]) caja_chaflan([cw, cl, chh + 3], 3);
        translate([-cw, -cl, 0]) cube([2*cw, 2*cl, chh + 1]);
    }
    translate([-cw/2, -cl/2 - 13, 0]) hull() {
        translate([3, 0, 0]) cube([cw - 6, 13 + e, 2.4]);
        translate([0, 3, 0]) cube([cw, 10 + e, 2.4]);
    }
}

module base_accesorio() {
    // Plantilla para diseñar accesorios nuevos: tapón + plataforma de 26 x 26
    tapon();
    translate([-13, -13, 0]) cube([26, 26, 2]);
}

module prueba_encaje() {
    // Bloque pequeño con el mismo hueco que la cabeza, para calibrar la holgura
    s = 28; h = enchufe_prof + piel + iman_h;
    difference() {
        translate([-s/2, -s/2, 0]) cube([s, s, h]);
        enchufe_hembra(h);
        huecos_iman(-e);
        translate([0, -s/2 + 0.6, h/2]) rotate([90, 0, 0]) linear_extrude(1)
            text(str(holgura), size = 4, halign = "center", valign = "center");
    }
}

// --------------------- Orientaciones de impresión ---------------------
if (parte == "carcasa")        rotate([90, 0, 0]) carcasa();   // frente sobre la cama
if (parte == "tapa_trasera")   translate([0, 0, D]) rotate([-90, 0, 0]) translate([0, 0, 0]) tapa_trasera();
if (parte == "pico")           translate([0, 0, -pico_z]) pico();
if (parte == "cola")           translate([0, 0, -cola_z]) cola();
if (parte == "patas")          for (i = [0, 1]) translate([i*(pata_w + 5), 0, 0]) pata();
if (parte == "gorra")          translate([0, 0, 15]) rotate([-90, 0, 0]) gorra();
if (parte == "base_accesorio") translate([0, 0, 2]) rotate([180, 0, 0]) base_accesorio();
if (parte == "prueba_encaje")  prueba_encaje();

if (parte == "ensamblaje") {
    translate([0, 0, pata_h]) {
        color("#031428") carcasa();
        color("#0b2140") tapa_trasera();
        color("#C1D42F") pico();
        color("#031428") cola();
        color("#C1D42F") translate([W/2, enchufe_y, H]) gorra();
    }
    color("#C1D42F") for (s = [-1, 1]) translate([W/2 + s*pata_sep - pata_w/2, D_c/2 - pata_l/2, 0]) pata();
}
